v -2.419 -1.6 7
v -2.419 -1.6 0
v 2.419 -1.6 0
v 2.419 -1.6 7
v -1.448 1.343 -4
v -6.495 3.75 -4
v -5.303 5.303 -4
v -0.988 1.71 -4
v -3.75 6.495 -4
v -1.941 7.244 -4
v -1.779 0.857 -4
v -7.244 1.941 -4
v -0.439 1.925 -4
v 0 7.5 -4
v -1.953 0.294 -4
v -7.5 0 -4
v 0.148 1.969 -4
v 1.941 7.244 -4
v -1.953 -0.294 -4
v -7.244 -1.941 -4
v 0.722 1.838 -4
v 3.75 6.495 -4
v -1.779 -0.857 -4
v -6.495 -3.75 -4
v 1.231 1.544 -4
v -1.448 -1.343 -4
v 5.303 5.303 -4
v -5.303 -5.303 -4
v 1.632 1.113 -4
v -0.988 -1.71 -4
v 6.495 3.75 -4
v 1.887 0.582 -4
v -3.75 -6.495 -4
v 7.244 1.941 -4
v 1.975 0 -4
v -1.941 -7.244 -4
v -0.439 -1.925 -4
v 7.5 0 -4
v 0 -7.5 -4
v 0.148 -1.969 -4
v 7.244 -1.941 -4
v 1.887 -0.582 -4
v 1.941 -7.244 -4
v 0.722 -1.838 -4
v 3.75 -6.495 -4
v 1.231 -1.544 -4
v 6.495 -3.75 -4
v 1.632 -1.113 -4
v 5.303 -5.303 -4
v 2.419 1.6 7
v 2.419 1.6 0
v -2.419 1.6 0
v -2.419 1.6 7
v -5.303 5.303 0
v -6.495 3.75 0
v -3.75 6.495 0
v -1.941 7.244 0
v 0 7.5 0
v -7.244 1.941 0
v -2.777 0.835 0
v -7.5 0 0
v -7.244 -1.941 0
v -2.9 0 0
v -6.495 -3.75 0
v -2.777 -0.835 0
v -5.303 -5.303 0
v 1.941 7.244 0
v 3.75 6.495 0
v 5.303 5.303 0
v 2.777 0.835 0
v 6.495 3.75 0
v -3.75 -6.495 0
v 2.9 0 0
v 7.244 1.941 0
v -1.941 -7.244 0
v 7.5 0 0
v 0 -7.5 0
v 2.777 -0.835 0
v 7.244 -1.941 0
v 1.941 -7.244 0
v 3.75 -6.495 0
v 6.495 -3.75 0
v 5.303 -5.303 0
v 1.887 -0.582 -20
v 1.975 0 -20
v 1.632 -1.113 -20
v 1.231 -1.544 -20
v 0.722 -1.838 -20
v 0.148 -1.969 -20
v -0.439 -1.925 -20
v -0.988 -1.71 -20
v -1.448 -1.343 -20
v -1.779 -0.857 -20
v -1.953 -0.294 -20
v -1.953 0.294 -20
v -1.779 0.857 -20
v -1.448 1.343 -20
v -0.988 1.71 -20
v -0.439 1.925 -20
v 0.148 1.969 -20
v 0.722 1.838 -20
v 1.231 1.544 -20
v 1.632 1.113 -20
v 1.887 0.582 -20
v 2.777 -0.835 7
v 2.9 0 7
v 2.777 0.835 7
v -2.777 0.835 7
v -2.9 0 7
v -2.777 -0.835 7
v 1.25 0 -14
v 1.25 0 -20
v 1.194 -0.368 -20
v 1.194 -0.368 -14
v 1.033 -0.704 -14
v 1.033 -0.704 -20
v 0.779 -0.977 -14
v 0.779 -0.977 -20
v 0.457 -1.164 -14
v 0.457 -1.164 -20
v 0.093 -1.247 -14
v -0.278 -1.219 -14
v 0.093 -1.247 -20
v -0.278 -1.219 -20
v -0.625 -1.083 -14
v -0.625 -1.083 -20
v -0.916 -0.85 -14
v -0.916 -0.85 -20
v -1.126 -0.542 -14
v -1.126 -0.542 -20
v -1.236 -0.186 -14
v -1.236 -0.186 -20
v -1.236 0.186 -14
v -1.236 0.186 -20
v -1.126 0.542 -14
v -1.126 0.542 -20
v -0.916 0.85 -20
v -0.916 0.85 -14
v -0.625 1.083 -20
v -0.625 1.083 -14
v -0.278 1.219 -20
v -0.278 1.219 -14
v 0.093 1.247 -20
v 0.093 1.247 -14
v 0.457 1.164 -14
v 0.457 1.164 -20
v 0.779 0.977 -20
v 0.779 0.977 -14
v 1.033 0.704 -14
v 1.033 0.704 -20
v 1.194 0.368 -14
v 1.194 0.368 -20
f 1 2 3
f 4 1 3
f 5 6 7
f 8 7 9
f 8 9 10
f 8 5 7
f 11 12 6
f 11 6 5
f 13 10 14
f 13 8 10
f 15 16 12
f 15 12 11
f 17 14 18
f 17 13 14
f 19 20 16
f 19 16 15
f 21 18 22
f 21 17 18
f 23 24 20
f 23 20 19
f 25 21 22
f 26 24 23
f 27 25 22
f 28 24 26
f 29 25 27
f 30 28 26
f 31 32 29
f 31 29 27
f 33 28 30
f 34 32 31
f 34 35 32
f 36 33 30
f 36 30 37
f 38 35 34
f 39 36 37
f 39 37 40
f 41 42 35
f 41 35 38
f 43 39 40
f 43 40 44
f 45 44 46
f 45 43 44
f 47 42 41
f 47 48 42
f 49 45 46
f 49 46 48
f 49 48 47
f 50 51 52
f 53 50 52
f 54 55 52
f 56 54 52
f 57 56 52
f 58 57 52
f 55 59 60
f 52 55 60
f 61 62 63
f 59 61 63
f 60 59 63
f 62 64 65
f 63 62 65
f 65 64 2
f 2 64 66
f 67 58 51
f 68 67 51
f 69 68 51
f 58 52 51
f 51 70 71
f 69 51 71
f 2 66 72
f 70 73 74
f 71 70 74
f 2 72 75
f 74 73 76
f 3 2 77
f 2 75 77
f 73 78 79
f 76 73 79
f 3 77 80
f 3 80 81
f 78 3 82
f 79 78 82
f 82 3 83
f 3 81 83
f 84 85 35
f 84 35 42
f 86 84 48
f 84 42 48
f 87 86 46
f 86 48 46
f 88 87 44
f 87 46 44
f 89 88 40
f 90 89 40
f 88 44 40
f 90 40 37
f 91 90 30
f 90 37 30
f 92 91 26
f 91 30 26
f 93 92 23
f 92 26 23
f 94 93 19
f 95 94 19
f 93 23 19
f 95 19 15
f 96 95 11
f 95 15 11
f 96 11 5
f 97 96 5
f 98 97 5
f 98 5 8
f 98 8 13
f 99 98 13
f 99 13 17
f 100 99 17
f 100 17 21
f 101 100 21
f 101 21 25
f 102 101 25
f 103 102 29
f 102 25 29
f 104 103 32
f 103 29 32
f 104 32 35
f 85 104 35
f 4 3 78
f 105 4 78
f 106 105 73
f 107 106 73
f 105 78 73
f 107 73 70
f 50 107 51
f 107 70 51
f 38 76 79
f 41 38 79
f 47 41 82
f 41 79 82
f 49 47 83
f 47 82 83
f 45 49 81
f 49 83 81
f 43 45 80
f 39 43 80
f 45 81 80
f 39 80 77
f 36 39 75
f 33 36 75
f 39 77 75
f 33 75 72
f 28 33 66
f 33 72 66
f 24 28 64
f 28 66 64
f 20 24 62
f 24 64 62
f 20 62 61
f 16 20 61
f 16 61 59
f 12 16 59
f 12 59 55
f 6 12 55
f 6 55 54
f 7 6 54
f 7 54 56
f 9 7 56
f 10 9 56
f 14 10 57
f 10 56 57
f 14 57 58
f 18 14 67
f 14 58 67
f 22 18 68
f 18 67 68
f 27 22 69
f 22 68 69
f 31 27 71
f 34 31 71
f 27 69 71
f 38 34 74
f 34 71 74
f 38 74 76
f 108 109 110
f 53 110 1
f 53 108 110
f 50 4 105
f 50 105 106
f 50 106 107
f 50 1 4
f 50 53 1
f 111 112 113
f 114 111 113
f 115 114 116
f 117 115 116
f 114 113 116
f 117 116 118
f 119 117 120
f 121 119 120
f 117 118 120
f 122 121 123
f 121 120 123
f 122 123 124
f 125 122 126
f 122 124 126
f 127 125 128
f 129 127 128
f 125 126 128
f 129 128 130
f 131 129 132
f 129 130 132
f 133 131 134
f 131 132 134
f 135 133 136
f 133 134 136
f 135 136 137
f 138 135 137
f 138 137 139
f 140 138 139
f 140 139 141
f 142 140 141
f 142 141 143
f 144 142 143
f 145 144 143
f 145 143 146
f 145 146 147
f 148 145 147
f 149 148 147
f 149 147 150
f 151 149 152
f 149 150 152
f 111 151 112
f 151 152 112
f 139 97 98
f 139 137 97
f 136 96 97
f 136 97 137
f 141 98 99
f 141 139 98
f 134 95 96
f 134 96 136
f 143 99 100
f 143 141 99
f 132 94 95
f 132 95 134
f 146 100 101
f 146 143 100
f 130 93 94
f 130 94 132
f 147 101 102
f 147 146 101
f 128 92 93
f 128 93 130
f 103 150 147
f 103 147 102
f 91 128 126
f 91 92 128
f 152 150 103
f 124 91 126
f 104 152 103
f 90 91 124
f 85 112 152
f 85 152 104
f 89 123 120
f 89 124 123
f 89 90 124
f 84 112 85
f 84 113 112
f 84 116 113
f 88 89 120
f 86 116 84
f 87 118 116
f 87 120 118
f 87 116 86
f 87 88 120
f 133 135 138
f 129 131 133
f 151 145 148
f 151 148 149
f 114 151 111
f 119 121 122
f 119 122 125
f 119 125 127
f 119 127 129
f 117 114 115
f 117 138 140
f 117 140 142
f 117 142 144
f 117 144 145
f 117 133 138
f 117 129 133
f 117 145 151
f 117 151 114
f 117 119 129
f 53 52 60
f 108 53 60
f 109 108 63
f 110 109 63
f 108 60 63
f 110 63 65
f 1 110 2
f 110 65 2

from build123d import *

# Parameters (mm, degrees)
F1_DEPTH = 7
F2_R     = 7.5
F3_DEPTH = 4
F4_R     = 1.975
F5_DEPTH = 16
F6_R     = 1.25
F7_DEPTH = 6


with BuildPart() as f1:
    # F0 (on Top) → F1 (new body)
    with BuildSketch(Plane.XY):
        with BuildLine():
            ThreePointArc((2.418677, -1.6), (2.9, 0), (2.418677, 1.6))
            Line((2.418677, 1.6), (-2.418677, 1.6))
            ThreePointArc((-2.418677, 1.6), (-2.9, 0), (-2.418677, -1.6))
            Line((-2.418677, -1.6), (2.418677, -1.6))
        make_face()
    extrude(amount=F1_DEPTH)

    # F2 (on face) → F3 (join)
    with BuildSketch(Plane(origin=(0, 0, 0), x_dir=(1, 0, 0), z_dir=(0, 0, -1))):
        Circle(F2_R)
    extrude(amount=F3_DEPTH)

    # F4 (on face) → F5 (join)
    with BuildSketch(Plane(origin=(0, 0, -4), x_dir=(1, 0, 0), z_dir=(0, 0, -1))):
        Circle(F4_R)
    extrude(amount=F5_DEPTH)

    # F6 (on face) → F7 (cut)
    with BuildSketch(Plane(origin=(0, 0, -20), x_dir=(1, 0, 0), z_dir=(0, 0, -1))):
        Circle(F6_R)
    extrude(amount=-F7_DEPTH, mode=Mode.SUBTRACT)


solid = f1.part
